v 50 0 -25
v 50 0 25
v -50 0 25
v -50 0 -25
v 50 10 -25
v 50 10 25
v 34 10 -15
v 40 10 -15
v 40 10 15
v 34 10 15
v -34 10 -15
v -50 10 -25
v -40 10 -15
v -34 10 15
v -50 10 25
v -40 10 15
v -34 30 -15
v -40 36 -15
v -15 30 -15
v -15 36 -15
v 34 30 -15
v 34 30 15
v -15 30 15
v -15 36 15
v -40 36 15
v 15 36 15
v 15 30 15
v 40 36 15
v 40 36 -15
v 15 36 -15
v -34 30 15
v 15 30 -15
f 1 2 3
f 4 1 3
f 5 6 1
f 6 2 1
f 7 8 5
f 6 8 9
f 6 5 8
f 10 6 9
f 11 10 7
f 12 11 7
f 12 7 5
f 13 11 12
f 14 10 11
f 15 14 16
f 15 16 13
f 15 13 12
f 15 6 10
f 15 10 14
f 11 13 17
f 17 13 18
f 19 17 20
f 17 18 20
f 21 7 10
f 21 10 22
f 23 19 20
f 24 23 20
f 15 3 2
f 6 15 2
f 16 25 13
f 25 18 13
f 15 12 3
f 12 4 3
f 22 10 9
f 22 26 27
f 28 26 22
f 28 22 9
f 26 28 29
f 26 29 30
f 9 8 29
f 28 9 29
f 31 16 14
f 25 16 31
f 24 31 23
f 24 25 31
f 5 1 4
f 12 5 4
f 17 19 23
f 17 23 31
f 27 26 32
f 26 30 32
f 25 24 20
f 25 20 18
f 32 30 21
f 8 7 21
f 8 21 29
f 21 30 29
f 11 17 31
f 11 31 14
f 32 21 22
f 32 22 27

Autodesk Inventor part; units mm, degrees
ref_plane "YZ Plane" through (0, 0, 0) normal (1, 0, 0) x (0, 1, 0)
ref_plane "XZ Plane" through (0, 0, 0) normal (0, 1, 0) x (-1, 0, 0)
ref_plane "XY Plane" through (0, 0, 0) normal (0, 0, 1) x (1, 0, 0)
sketch "Sketch1" plane through (0, 0, 0) normal (0, 1, 0) x (-1, 0, 0)
  line L0 (-50, -25) -> (50, -25)
  line L1 (50, -25) -> (50, 25)
  line L2 (50, 25) -> (-50, 25)
  line L3 (-50, 25) -> (-50, -25)
  line L4 (-50, -25) -> (50, 25) construction
  line L5 (50, -25) -> (-50, 25) construction
  point P0 (0, 0)
  dimension "d0" = 100
  dimension "d1" = 50
extrude "Extrusion1" add sketch "Sketch1" along normal blind 10
sketch "Sketch2" plane through (0, 0, 0) normal (0, 0, 1) x (1, 0, 0)
  line L0 (-50, 10) -> (50, 10) projected
  line L1 (31.5957, 10) -> (-31.5209, 10)
  line L2 (15, 10) -> (-15, 10)
  line L3 (-15, 10) -> (-15, 36)
  line L4 (-15, 36) -> (15, 36)
  line L5 (15, 36) -> (15, 10)
  line L6 (15, 10) -> (-15, 36) construction
  line L7 (-15, 10) -> (15, 36) construction
  line L8 (34, 30) -> (-34, 30)
  line L9 (-34, 30) -> (-34, 10)
  line L10 (-34, 10) -> (34, 10)
  line L11 (34, 10) -> (34, 30)
  line L12 (34, 30) -> (-34, 10) construction
  line L13 (-34, 30) -> (34, 10) construction
  line L14 (40, 36) -> (-40, 36)
  line L15 (-40, 36) -> (-40, 10)
  line L16 (-40, 10) -> (40, 10)
  line L17 (40, 10) -> (40, 36)
  line L18 (40, 36) -> (-40, 10) construction
  line L19 (-40, 36) -> (40, 10) construction
  line L20 (-50, 0) -> (50, 0) projected
  point P0 (0, 0)
  point P1 (0, 23)
  point P2 (0, 20)
  point P3 (0, 23)
  point P4 (-34, 20)
  point P5 (0, 0)
  point P6 (0, 0)
  point P7 (0, 0)
  point P8 (0, 10)
  point P9 (40, 10)
  point P10 (15, 36)
  point P11 (15, 30)
  point P12 (34, 10)
  point P13 (-34, 10)
  point P14 (-15, 30)
  point P15 (-15, 36)
  dimension "d5" = 80
  dimension "d7" = 0
  dimension "d8" = 6
  dimension "d9" = 30
  dimension "d10" = 20
  dimension "d13" = 68
extrude "Extrusion2" add sketch "Sketch2" along normal mid plane 30 contours L15 L14 L3 L8 L9 L0 | L14 L17 L0 L11 L8 L5
properties part number "holder sensor"
